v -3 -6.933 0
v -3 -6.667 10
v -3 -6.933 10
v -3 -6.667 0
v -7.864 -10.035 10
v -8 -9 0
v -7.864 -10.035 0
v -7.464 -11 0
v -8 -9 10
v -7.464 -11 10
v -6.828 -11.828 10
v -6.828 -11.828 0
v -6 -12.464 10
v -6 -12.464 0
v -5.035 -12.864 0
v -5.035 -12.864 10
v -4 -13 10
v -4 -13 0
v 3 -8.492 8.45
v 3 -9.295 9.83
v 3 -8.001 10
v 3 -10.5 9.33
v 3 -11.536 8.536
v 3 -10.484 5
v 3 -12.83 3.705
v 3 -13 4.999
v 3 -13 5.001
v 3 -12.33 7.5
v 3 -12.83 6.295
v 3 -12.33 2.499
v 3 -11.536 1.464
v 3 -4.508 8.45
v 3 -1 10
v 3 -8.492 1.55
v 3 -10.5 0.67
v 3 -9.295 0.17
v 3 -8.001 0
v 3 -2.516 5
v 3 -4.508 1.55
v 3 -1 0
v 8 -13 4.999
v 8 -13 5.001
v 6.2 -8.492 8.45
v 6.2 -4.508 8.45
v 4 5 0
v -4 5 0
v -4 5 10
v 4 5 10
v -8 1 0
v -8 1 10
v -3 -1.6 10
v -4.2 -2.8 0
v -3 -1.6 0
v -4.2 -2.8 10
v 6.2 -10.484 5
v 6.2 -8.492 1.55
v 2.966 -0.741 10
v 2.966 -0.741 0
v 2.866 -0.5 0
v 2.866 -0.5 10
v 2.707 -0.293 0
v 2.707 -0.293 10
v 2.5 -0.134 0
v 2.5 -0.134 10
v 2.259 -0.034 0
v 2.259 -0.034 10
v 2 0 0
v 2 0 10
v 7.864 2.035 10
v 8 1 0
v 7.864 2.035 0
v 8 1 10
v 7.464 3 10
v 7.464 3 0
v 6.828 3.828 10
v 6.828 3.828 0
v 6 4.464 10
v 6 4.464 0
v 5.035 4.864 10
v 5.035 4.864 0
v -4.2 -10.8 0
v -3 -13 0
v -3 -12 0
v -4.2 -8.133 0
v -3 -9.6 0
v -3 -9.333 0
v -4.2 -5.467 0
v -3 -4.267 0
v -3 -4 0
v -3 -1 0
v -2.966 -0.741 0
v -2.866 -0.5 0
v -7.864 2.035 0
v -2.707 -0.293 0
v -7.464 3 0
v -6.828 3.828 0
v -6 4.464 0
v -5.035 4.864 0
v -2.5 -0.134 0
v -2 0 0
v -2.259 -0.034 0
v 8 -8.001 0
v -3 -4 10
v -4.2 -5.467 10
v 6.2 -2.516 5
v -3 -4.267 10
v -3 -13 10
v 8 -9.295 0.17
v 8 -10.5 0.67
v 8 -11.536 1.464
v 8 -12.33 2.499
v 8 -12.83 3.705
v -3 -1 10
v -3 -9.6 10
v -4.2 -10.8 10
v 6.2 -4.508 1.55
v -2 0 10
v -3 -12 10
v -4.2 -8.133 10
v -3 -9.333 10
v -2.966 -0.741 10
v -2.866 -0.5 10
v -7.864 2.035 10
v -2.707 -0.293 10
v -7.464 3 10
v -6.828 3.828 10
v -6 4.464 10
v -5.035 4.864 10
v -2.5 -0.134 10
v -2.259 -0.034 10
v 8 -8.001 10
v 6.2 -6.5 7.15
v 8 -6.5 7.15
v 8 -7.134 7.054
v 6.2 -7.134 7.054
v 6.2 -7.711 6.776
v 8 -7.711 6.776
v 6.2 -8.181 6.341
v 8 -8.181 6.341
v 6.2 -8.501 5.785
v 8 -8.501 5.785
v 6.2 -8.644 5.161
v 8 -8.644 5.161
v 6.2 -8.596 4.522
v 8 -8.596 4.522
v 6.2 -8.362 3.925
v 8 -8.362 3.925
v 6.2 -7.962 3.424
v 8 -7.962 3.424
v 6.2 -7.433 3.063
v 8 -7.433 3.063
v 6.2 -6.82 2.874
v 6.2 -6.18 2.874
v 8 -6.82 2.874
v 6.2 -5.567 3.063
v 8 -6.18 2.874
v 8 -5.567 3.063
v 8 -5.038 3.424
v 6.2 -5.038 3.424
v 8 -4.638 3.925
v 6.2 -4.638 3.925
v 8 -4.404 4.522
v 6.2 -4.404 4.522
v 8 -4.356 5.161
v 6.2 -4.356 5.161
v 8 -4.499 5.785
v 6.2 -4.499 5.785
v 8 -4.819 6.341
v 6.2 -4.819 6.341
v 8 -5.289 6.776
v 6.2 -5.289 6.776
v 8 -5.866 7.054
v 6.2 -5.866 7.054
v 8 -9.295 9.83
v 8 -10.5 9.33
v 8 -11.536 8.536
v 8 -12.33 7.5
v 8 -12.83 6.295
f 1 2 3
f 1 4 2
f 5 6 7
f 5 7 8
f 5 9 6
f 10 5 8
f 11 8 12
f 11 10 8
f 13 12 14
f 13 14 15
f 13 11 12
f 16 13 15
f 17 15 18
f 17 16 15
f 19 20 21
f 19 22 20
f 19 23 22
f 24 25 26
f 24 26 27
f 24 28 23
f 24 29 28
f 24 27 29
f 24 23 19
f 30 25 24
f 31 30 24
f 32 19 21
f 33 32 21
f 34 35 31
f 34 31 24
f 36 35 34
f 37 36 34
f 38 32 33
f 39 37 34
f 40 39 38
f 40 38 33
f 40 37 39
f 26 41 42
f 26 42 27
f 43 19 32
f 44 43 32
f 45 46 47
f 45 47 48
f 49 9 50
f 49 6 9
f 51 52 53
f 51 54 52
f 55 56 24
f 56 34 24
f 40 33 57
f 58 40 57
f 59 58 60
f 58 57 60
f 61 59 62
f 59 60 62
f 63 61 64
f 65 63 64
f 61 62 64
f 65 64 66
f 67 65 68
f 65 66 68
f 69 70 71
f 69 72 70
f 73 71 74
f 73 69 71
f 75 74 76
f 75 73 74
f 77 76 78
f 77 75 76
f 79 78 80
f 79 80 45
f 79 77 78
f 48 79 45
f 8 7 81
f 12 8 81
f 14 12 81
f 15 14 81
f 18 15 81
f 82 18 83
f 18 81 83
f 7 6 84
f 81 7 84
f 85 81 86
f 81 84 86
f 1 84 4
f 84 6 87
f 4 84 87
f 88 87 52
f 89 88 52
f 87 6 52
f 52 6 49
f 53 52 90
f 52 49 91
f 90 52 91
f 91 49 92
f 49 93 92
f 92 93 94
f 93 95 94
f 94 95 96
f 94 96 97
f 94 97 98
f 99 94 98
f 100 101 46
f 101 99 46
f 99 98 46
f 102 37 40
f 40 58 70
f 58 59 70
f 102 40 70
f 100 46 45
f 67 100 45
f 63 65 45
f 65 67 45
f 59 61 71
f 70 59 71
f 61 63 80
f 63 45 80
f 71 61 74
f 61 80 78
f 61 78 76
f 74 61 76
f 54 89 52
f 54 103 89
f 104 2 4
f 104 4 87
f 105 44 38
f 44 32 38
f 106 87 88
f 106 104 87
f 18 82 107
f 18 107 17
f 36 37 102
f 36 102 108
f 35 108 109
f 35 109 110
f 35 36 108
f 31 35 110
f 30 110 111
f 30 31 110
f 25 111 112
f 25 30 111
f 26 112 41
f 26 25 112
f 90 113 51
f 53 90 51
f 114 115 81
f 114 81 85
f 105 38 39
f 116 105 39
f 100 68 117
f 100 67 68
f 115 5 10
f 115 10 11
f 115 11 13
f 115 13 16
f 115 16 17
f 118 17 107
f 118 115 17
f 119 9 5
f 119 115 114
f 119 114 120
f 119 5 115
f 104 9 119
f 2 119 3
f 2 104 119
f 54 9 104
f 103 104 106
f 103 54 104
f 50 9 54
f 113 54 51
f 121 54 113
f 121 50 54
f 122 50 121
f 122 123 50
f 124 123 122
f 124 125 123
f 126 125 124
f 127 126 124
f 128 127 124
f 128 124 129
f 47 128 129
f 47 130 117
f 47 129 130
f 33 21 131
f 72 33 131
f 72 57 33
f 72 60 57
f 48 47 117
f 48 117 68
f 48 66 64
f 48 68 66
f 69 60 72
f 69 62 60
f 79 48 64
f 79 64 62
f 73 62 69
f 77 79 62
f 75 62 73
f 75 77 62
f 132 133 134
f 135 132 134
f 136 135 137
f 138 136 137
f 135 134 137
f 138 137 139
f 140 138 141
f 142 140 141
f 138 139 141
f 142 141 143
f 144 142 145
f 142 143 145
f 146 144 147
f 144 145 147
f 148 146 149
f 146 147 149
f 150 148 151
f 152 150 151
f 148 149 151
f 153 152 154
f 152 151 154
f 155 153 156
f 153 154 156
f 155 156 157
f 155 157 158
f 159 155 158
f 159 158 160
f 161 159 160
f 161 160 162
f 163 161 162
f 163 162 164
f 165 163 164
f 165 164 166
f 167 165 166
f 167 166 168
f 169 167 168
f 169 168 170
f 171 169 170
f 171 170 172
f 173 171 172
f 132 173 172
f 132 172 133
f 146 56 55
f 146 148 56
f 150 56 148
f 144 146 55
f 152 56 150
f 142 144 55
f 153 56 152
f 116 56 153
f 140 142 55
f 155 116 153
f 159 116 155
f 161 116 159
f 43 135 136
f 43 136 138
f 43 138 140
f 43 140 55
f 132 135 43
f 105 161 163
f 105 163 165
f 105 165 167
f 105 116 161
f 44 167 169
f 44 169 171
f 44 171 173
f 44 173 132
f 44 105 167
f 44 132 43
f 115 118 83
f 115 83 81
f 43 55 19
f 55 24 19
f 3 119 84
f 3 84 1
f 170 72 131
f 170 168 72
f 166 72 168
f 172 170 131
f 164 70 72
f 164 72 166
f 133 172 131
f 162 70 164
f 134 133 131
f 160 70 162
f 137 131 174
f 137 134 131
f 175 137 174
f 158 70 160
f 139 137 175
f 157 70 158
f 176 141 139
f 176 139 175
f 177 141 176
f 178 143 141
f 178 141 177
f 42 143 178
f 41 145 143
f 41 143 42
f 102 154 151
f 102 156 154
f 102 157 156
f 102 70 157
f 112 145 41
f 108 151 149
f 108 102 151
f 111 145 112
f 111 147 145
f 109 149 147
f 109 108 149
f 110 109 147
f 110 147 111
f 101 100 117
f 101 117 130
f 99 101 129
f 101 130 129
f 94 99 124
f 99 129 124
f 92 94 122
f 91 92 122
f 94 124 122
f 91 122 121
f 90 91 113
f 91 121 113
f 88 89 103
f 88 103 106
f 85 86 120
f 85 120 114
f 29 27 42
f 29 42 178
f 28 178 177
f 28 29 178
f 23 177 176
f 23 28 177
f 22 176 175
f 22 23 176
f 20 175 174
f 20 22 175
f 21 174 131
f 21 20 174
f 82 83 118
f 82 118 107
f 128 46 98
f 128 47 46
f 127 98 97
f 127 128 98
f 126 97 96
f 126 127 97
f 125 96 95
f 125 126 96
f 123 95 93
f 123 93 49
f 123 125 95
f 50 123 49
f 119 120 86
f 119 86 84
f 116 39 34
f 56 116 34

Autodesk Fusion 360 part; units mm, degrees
sketch "Sketch1" plane through (0, 0, 0) normal (0, 0, 1) x (1, 0, 0)
  line L0 (-3, -13) -> (-8, -13)
  line L1 (-8, -13) -> (-8, 5)
  line L2 (-8, 5) -> (8, 5)
  line L3 (8, 5) -> (8, -13)
  line L4 (8, -13) -> (3, -13)
  line L5 (3, -13) -> (3, 0)
  line L6 (3, 0) -> (-3, 0)
  line L7 (-3, 0) -> (-3, -13)
  dimension "d1" = 6
  dimension "d2" = 5
  dimension "d3" = 5
  dimension "d4" = 5
  dimension "d6" = 13
extrude "Extrude1" add sketch "Sketch1" along normal blind 10 makes body 1
sketch "Sketch2" plane through (3, 0, 0) normal (-1, 0, 0) x (0, 0, 1)
  line L0 (0, 0) -> (0, -13)
  line L1 (0, -13) -> (10, -13)
  line L2 (10, -13) -> (10, 0)
  line L3 (10, 0) -> (0, 0)
  line L4 (8.45, -8.4919) -> (8.45, -4.5081)
  line L5 (8.45, -4.5081) -> (5, -2.5163)
  line L6 (5, -2.5163) -> (1.55, -4.5081)
  line L7 (1.55, -4.5081) -> (1.55, -8.4919)
  line L8 (1.55, -8.4919) -> (5, -10.4837)
  line L9 (5, -10.4837) -> (8.45, -8.4919)
  point P0 (5, -6.5)
  point P1 (5, 0)
  dimension "d9" = 3.45
  dimension "d10" = 6.5
extrude "Extrude2" cut sketch "Sketch2" against normal blind 3.2 contours L4 L5 L6 L7 L8 L9 bodies 1
hole "Hole1" at (3, -6.5, 5) direction (1, 0, 0) diameter 4.3 end through all bodies 1
sketch "Sketch3" plane through (0, 0, 0) normal (1, 0, 0) x (0, 0, -1)
  circle A0 centre (0, 0) radius 8
  line L0 (0, -3.9837) -> (3.45, -1.9919)
  line L1 (3.45, -1.9919) -> (3.45, 1.9919)
  line L2 (3.45, 1.9919) -> (0, 3.9837)
  line L3 (0, 3.9837) -> (-3.45, 1.9919)
  line L4 (-3.45, 1.9919) -> (-3.45, -1.9919)
  line L5 (-3.45, -1.9919) -> (0, -3.9837)
  circle A1 centre (0, 9) radius 1.75
  circle A2 centre (-4.1825, 7.9691) radius 1.75
  circle A3 centre (-7.4069, 5.1126) radius 1.75
  circle A4 centre (-8.9344, 1.0848) radius 1.75
  circle A5 centre (-8.4151, -3.1914) radius 1.75
  circle A6 centre (-5.9681, -6.7366) radius 1.75
  circle A7 centre (-2.1538, -8.7385) radius 1.75
  circle A8 centre (2.1538, -8.7385) radius 1.75
  circle A9 centre (5.9681, -6.7366) radius 1.75
  circle A10 centre (8.4151, -3.1914) radius 1.75
  circle A11 centre (8.9344, 1.0848) radius 1.75
  circle A12 centre (7.4069, 5.1126) radius 1.75
  circle A13 centre (4.1825, 7.9691) radius 1.75
  dimension "d16" = 16
  dimension "d17" = 3.45
  dimension "d18" = 3.5
  dimension "d19" = 9
  dimension "d21" = 360
extrude "Extrude3" add sketch "Sketch3" along normal blind 5 separate body contours A0 A1 A2 A3 A4 A5 A6 A7 A8 A9 A10 A11 A12 A13 | L0 L1 L2 L3 L4 L5 makes body 2
extrude "Extrude4" cut sketch "Sketch3" along normal blind 3 contours L0 L1 L2 L3 L4 L5 bodies 2
hole "Hole2" at (0, 0, 0) direction (1, 0, 0) diameter 4.2 end through all bodies 2
sketch "Sketch4" plane through (0, 0, 10) normal (0, 0, 1) x (1, 0, 0)
  line L0 (-3, 0) -> (3, 0)
  line L1 (3, 0) -> (3, -13)
  line L2 (3, -13) -> (8, -13)
  line L3 (8, -13) -> (8, 5)
  line L4 (8, 5) -> (-8, 5)
  line L5 (-8, 5) -> (-8, -13)
  line L6 (-8, -13) -> (-3, -13)
  line L7 (-3, -13) -> (-3, 0)
  line L8 (-3, -12) -> (-4.2, -10.8)
  line L9 (-4.2, -10.8) -> (-3, -9.6)
  line L10 (-4.2, -8.1333) -> (-3, -6.9333)
  line L11 (-3, -9.3333) -> (-4.2, -8.1333)
  line L12 (-4.2, -5.4667) -> (-3, -4.2667)
  line L13 (-3, -6.6667) -> (-4.2, -5.4667)
  line L14 (-4.2, -2.8) -> (-3, -1.6)
  line L15 (-3, -4) -> (-4.2, -2.8)
  dimension "d29" = 1.2
  dimension "d30" = 1
  dimension "d33" = 0
  dimension "d34" = 8
extrude "Extrude5" cut sketch "Sketch4" against normal through all contours L7 L14 L15 | L7 L12 L13 | L7 L10 L11 | L7 L8 L9 bodies 1
fillet "Fillet2" radius 5 2 edges at (5.5, -13, 10) (5.5, -13, 0) on bodies 1
fillet "Fillet1" radius 4 3 edges at (-8, 5, 5) (8, 5, 5) (-8, -13, 5) on bodies 1
fillet "Fillet1" radius 1 2 edges at (-3, 0, 5) (3, 0, 5) on bodies 1
fillet "Fillet3" radius 1 26 edges at (0, 4.1185, 5.9666) (0, 2.8368, 7.4801) (0, 0.8739, 7.1971) (0, -0.9643, 7.9417) (0, -2.5709, 6.7789) (0, -4.5445, 6.5839) (0, -5.4267, 4.8076) (0, -7.0836, 3.7178) (0, -7.0393, 1.735) (0, -8, 0) (0, -7.0393, -1.735) (0, -7.0836, -3.7178) (0, -5.4267, -4.8076) (0, -4.5445, -6.5839) (0, -2.5709, -6.7789) (0, -0.9643, -7.9417) (0, 0.8739, -7.1971) (0, 2.8368, -7.4801) (0, 4.1185, -5.9666) (0, 5.9881, -5.305) (0, 6.4196, -3.3692) (0, 7.7675, -1.9145) (0, 7.25, 0) (0, 7.7675, 1.9145) (0, 6.4196, 3.3692) (0, 5.9881, 5.305) on bodies 2
hidden bodies 2
equation "d9 = ( 6.9 / 2 ) * 1 mm"
